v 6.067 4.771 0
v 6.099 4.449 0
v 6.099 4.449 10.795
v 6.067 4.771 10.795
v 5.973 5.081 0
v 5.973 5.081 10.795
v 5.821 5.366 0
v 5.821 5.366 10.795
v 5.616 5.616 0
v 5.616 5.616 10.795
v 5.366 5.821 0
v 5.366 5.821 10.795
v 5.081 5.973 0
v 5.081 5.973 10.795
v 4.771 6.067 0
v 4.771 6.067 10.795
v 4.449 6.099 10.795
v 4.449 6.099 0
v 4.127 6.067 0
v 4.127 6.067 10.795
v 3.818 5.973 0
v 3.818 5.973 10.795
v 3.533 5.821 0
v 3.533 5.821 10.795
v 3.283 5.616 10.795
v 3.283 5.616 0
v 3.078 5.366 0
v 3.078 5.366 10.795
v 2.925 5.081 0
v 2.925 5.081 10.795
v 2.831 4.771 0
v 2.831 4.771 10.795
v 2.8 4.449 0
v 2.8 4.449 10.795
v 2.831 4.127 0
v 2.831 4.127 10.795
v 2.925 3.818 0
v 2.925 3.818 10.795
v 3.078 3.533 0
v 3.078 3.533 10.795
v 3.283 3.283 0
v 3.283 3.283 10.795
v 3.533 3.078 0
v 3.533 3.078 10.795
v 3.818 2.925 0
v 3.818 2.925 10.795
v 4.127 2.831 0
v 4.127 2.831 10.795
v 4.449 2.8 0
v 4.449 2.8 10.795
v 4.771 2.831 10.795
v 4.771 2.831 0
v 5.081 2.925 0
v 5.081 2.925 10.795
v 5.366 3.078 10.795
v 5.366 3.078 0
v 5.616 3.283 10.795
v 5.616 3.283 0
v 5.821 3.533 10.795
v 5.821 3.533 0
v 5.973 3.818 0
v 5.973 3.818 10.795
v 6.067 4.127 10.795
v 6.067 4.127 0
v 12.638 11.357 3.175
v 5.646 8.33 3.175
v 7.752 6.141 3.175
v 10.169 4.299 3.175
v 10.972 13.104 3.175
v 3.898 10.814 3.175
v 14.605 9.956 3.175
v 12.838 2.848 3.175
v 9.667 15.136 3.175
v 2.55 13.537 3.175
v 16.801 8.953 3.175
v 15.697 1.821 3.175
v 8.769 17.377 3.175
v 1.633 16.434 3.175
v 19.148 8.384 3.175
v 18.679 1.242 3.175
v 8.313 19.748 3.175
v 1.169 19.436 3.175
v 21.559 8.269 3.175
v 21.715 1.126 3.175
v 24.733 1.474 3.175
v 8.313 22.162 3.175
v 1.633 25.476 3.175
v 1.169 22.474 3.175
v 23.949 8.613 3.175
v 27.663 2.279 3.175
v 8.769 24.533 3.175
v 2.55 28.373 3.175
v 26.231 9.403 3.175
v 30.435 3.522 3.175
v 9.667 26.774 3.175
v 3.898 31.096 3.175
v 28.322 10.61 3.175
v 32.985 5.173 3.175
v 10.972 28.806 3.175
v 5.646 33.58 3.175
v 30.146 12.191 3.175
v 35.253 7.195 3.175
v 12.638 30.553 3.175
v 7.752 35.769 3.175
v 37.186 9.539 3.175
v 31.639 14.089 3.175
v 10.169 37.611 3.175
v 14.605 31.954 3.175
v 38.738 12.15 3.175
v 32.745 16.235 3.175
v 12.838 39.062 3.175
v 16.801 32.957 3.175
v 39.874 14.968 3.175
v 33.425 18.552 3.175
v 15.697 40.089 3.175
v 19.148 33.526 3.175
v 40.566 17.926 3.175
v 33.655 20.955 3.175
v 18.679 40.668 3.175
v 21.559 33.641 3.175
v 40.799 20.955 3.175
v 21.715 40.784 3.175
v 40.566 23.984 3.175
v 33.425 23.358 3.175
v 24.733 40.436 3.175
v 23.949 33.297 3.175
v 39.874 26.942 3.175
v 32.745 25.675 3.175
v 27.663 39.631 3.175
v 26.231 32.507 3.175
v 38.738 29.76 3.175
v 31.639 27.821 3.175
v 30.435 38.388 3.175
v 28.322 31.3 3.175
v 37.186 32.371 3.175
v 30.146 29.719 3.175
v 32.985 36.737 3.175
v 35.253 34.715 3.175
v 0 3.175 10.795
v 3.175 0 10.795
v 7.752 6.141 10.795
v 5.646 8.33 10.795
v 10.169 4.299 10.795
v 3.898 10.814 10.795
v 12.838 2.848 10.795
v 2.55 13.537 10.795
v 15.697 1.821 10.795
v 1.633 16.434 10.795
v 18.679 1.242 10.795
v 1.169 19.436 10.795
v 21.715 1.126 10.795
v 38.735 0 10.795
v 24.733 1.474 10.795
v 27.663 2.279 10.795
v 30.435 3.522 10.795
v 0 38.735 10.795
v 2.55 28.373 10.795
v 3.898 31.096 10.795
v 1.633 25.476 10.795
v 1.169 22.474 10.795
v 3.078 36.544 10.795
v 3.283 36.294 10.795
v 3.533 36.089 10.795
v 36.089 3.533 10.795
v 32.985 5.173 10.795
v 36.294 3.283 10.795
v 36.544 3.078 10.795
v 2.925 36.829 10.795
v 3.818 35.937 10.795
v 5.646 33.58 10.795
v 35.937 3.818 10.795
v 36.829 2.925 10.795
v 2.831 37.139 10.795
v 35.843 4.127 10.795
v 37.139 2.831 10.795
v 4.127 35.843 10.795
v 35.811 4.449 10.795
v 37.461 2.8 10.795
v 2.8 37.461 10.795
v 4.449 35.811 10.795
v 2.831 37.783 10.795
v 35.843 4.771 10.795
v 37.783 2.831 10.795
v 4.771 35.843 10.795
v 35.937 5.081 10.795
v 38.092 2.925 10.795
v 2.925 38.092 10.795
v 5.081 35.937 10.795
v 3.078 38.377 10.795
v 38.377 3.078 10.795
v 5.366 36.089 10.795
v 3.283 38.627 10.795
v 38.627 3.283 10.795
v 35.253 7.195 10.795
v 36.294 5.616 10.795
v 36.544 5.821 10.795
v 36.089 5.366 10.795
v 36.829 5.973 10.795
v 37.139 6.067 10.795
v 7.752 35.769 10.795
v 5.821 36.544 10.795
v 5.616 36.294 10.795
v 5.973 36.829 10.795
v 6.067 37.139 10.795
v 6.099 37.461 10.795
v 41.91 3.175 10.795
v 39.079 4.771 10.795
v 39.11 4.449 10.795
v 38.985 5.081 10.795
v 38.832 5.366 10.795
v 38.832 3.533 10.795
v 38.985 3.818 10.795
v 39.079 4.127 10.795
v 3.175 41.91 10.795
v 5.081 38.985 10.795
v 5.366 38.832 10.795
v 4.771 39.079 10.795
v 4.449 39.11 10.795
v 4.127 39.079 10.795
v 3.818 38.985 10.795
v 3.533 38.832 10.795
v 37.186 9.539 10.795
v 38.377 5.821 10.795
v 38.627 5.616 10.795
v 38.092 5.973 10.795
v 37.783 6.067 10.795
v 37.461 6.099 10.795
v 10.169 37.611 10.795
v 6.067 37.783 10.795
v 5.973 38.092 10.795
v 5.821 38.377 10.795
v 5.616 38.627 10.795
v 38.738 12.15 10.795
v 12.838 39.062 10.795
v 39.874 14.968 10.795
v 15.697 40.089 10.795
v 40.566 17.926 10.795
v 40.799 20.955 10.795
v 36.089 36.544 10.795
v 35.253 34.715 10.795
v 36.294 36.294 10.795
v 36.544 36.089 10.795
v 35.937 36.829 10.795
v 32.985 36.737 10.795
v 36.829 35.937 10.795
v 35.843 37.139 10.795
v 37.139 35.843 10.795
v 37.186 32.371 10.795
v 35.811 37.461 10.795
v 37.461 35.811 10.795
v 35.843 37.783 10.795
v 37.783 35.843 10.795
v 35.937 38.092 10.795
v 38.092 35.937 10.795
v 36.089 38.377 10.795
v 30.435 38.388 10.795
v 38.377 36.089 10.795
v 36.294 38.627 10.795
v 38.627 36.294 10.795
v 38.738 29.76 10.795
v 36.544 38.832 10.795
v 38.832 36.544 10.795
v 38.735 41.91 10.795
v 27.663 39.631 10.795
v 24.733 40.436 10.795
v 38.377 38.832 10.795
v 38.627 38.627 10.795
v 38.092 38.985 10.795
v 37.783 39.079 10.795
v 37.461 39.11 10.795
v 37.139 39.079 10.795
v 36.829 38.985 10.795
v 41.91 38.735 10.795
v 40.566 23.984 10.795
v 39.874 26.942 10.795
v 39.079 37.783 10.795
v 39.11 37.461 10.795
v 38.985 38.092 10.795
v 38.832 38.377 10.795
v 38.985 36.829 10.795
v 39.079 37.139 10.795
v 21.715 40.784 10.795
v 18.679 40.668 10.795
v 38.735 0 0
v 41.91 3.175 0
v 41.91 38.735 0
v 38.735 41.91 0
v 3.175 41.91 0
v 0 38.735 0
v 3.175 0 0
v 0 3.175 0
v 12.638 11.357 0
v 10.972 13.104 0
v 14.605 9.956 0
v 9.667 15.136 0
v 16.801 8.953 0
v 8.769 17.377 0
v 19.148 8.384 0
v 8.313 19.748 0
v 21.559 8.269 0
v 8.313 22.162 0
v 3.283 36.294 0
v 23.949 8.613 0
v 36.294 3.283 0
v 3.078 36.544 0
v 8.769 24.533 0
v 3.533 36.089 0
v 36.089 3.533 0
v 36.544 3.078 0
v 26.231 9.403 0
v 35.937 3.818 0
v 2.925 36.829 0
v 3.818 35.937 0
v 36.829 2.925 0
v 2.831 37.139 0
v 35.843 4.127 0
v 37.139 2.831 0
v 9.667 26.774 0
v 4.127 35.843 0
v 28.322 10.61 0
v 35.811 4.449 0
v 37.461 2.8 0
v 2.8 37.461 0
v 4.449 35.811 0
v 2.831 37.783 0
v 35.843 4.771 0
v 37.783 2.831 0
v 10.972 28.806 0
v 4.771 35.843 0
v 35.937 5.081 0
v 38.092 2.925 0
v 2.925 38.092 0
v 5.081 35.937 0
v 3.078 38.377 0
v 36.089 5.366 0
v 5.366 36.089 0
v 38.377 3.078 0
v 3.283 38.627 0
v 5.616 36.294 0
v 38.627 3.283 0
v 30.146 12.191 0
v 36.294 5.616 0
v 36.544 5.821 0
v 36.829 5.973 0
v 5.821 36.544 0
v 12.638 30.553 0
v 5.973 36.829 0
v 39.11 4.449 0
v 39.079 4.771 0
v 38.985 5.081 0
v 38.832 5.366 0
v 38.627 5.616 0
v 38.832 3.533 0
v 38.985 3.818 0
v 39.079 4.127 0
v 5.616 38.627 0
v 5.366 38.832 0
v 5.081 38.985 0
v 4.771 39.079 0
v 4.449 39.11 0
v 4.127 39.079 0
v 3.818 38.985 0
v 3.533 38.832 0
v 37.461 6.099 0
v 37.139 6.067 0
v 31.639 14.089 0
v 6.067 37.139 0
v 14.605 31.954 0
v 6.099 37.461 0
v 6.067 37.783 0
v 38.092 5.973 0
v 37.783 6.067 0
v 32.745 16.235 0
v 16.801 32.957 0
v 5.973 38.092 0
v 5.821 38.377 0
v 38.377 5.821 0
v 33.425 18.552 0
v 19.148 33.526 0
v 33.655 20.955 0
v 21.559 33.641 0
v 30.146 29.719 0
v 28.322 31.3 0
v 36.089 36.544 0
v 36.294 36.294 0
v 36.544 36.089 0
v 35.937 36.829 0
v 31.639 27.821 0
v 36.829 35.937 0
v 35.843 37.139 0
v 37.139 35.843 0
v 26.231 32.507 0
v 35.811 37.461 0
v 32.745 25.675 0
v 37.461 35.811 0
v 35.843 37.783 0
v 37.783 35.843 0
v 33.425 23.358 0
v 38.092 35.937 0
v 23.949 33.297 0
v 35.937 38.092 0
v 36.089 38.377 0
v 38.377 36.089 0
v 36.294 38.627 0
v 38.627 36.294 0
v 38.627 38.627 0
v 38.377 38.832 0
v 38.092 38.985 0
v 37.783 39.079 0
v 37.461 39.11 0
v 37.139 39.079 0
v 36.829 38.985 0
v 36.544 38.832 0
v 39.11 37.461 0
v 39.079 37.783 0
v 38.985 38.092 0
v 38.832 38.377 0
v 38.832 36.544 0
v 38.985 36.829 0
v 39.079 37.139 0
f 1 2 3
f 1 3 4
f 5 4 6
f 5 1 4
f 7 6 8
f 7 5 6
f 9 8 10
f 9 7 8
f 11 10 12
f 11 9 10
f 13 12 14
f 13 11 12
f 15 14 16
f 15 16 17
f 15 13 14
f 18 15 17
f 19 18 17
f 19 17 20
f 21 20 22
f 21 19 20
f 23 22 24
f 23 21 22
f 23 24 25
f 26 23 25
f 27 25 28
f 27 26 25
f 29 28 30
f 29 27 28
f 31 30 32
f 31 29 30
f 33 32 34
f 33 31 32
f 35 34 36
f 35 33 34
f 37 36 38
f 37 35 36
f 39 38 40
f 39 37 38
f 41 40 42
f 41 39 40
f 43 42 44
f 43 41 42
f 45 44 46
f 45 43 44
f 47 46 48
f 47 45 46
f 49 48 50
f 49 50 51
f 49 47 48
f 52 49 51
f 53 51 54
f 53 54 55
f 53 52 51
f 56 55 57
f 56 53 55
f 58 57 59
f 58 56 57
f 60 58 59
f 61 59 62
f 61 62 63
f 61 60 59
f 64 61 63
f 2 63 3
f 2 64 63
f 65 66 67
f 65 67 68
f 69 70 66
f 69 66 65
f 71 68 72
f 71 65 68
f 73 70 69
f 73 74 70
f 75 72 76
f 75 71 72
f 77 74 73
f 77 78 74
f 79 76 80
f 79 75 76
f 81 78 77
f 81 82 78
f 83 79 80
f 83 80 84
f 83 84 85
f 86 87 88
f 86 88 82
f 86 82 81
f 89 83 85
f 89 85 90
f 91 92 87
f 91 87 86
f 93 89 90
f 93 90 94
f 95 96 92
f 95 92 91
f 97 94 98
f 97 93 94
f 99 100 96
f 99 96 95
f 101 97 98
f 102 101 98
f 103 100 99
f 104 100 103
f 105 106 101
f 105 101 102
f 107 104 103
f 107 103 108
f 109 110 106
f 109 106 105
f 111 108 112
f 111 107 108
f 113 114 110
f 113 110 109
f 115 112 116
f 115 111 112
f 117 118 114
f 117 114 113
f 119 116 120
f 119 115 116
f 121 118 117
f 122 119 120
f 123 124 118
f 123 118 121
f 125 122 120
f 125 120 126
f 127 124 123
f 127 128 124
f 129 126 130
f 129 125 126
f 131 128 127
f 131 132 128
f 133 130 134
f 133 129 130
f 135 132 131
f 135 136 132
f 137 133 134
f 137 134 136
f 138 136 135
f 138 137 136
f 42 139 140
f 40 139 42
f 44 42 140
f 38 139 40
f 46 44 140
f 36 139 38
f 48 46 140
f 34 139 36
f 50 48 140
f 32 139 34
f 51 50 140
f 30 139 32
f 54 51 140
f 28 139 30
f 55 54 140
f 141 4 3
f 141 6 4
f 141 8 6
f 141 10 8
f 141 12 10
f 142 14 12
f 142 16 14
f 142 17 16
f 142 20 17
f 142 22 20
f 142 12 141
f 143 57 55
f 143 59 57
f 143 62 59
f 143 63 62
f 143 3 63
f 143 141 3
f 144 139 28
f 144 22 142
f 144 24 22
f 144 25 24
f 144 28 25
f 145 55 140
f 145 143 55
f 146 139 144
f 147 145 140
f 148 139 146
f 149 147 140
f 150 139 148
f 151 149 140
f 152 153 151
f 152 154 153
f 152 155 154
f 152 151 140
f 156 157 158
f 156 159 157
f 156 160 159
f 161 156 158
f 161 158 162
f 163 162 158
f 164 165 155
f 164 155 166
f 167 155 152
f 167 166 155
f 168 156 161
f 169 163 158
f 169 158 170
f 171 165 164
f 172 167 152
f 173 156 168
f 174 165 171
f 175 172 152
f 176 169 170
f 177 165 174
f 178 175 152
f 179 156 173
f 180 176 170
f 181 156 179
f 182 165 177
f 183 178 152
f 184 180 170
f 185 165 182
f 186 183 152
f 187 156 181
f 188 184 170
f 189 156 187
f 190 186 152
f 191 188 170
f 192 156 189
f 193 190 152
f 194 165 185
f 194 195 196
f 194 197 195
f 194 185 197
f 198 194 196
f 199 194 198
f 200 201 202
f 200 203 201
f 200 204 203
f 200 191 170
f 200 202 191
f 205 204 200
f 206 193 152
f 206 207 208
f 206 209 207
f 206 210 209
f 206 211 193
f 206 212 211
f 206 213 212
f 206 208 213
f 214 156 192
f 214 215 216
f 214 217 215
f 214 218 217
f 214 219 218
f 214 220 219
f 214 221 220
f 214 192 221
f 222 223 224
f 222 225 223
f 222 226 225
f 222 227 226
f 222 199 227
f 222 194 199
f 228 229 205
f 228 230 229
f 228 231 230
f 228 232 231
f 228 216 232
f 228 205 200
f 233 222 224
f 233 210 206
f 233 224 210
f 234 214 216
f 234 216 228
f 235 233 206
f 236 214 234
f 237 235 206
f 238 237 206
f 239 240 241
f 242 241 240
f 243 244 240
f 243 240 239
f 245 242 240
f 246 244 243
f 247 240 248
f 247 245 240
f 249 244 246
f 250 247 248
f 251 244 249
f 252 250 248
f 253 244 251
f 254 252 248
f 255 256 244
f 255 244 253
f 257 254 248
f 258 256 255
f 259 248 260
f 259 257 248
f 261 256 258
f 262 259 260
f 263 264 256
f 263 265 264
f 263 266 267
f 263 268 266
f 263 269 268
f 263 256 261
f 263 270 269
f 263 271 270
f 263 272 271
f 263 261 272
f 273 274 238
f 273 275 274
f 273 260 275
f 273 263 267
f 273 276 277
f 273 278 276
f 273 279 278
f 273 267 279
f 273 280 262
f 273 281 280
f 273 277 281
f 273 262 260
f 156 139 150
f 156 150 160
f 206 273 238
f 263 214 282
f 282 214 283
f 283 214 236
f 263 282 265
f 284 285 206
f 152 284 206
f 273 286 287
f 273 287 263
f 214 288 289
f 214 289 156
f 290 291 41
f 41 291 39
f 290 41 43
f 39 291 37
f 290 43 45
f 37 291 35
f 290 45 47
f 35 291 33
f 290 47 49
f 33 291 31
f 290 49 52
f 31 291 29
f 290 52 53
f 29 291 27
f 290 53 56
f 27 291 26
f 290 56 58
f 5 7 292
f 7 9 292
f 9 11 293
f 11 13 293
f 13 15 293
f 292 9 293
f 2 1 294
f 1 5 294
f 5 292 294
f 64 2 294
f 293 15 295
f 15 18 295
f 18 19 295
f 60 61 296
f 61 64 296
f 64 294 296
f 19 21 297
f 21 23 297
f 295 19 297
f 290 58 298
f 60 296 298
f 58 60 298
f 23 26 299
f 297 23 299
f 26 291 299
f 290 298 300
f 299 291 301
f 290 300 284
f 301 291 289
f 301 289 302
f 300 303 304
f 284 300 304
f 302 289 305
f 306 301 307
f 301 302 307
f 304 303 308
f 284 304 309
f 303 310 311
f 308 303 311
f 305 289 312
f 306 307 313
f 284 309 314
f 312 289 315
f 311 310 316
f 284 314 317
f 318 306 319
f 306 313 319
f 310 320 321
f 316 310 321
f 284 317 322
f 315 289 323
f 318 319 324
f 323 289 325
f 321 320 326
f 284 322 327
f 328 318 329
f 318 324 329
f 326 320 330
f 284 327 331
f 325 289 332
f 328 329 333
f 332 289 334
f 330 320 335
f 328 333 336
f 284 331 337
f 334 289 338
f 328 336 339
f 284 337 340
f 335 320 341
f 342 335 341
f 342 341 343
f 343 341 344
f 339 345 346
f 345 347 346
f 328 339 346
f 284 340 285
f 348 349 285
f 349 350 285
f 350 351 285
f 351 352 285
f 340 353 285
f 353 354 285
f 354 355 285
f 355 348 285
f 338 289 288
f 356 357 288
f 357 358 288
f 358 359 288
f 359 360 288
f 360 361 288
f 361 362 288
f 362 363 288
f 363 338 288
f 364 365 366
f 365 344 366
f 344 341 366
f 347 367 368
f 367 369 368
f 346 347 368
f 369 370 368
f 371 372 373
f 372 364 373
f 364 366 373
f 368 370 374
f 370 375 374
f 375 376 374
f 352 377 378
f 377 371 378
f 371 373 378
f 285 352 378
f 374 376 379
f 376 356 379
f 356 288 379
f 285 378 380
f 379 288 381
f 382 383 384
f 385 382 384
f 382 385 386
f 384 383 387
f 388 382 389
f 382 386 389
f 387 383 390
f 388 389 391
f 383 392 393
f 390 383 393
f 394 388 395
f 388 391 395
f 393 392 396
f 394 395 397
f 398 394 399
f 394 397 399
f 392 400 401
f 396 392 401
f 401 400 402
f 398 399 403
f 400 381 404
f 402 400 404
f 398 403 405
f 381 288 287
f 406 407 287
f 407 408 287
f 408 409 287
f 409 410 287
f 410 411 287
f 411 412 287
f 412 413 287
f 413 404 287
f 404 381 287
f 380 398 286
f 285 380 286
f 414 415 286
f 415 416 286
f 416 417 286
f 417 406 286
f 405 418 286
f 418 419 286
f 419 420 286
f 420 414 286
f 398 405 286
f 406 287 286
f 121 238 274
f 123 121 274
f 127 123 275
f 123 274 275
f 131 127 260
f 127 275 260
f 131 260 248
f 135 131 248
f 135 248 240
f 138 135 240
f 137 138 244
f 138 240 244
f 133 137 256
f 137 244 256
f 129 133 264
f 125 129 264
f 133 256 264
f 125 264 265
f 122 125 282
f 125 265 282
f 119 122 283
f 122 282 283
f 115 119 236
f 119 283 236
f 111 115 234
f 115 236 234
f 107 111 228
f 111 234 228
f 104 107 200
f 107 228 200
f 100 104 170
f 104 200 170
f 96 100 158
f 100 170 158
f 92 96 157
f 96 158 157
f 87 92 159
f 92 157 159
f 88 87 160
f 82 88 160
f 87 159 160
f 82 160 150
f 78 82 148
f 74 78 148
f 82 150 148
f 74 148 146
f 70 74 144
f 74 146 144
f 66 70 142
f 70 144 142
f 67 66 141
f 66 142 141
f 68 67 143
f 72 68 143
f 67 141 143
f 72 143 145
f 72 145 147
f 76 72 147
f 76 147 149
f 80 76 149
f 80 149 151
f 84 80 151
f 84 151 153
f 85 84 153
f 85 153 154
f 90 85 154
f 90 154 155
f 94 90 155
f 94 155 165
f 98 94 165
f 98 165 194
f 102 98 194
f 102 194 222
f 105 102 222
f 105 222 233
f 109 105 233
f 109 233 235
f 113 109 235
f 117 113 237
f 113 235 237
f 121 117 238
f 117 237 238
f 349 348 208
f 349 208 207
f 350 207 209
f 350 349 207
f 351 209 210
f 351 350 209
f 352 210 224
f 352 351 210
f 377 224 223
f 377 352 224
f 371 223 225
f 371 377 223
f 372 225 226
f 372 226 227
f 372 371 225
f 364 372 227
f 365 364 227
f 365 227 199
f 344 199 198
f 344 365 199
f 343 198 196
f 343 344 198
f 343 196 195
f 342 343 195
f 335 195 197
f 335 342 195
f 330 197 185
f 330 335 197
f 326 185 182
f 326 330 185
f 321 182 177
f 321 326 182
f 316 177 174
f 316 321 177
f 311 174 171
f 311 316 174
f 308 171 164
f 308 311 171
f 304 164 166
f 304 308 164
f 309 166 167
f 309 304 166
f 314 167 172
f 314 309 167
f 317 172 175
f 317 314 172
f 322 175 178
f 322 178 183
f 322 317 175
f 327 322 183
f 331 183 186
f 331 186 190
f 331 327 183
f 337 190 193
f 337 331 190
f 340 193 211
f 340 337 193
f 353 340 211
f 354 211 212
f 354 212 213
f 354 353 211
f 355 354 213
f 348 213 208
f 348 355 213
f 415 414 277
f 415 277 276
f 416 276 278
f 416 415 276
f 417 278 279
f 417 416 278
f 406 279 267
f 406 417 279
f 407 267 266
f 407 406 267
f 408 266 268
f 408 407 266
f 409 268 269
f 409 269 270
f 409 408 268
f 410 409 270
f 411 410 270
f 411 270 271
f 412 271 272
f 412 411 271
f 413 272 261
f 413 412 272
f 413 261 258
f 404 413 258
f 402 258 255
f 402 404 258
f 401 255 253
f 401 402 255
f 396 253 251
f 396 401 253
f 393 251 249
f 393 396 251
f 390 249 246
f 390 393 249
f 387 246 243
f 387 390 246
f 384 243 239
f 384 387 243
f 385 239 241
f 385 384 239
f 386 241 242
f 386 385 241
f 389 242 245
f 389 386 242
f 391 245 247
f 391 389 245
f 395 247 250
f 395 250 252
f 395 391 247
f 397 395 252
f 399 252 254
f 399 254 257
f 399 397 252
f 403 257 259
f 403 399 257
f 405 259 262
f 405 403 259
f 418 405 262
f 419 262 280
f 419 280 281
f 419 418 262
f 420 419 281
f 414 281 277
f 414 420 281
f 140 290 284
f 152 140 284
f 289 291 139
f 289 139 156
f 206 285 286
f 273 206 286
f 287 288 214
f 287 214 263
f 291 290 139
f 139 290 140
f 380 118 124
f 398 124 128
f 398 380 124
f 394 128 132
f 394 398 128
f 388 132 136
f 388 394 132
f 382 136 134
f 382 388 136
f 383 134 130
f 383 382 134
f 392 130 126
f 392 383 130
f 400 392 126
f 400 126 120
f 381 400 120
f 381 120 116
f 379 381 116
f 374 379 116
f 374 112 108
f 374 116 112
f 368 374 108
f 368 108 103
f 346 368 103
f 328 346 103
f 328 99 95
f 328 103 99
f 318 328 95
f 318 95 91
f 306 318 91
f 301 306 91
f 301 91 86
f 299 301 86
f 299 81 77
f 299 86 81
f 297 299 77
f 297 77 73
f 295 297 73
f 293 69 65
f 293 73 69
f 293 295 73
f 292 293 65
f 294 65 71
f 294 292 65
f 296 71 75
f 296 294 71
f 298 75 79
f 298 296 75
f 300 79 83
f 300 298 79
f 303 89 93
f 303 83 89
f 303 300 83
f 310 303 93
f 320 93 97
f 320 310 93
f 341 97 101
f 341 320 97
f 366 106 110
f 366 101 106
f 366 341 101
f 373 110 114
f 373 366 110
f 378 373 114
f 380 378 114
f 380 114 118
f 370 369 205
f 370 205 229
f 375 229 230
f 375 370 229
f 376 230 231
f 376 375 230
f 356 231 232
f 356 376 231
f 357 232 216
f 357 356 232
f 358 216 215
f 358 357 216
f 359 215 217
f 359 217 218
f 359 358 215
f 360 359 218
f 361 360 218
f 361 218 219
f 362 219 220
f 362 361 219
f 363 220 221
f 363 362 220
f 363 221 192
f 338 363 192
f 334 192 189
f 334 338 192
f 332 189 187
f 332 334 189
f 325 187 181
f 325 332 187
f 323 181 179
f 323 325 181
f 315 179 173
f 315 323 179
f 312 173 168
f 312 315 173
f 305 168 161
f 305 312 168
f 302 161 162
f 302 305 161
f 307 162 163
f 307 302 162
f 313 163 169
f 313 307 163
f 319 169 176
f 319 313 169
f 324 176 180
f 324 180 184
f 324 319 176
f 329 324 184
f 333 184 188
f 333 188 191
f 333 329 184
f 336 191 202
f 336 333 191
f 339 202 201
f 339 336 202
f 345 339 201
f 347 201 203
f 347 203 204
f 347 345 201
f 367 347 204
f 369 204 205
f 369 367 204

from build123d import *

# Parameters (mm, degrees)
SKETCH1_W           = 41.91
SKETCH1_H           = 41.91
SKETCH1_R           = 1.64973
SKETCH1_R_2         = 12.7
BOSS_EXTRUDE1_DEPTH = 10.795
SKETCH3_R           = 19.84375
CUT_EXTRUDE2_DEPTH  = 7.62
CHAMFER1_SIZE       = 3.175


with BuildPart() as part:
    # Sketch1 → Boss-Extrude1 (new body)
    with BuildSketch(Plane.XY):
        with Locations((20.955, 20.955)):
            Rectangle(SKETCH1_W, SKETCH1_H)
        with Locations((37.460710751, 37.460710751)):
            Circle(SKETCH1_R, mode=Mode.SUBTRACT)
        with Locations((37.460710751, 4.449289249)):
            Circle(SKETCH1_R, mode=Mode.SUBTRACT)
        with Locations((4.449289249, 4.449289249)):
            Circle(SKETCH1_R, mode=Mode.SUBTRACT)
        with Locations((4.449289249, 37.460710751)):
            Circle(SKETCH1_R, mode=Mode.SUBTRACT)
        with Locations((20.955, 20.955)):
            Circle(SKETCH1_R_2, mode=Mode.SUBTRACT)
    extrude(amount=BOSS_EXTRUDE1_DEPTH)

    # Sketch3 → Cut-Extrude2 (cut)
    with BuildSketch(Plane.XY.offset(10.795)):
        with Locations((20.955, 20.955)):
            Circle(SKETCH3_R)
    extrude(amount=-CUT_EXTRUDE2_DEPTH, mode=Mode.SUBTRACT)

    # Chamfer1
    chamfer1_edges = [part.edges().sort_by_distance(p)[0] for p in [
        (0, 41.91, 5.3975),
        (41.91, 41.91, 5.3975),
        (41.91, 0, 5.3975),
        (0, 0, 5.3975),
    ]]
    chamfer(chamfer1_edges, length=CHAMFER1_SIZE)


solid = part.part
